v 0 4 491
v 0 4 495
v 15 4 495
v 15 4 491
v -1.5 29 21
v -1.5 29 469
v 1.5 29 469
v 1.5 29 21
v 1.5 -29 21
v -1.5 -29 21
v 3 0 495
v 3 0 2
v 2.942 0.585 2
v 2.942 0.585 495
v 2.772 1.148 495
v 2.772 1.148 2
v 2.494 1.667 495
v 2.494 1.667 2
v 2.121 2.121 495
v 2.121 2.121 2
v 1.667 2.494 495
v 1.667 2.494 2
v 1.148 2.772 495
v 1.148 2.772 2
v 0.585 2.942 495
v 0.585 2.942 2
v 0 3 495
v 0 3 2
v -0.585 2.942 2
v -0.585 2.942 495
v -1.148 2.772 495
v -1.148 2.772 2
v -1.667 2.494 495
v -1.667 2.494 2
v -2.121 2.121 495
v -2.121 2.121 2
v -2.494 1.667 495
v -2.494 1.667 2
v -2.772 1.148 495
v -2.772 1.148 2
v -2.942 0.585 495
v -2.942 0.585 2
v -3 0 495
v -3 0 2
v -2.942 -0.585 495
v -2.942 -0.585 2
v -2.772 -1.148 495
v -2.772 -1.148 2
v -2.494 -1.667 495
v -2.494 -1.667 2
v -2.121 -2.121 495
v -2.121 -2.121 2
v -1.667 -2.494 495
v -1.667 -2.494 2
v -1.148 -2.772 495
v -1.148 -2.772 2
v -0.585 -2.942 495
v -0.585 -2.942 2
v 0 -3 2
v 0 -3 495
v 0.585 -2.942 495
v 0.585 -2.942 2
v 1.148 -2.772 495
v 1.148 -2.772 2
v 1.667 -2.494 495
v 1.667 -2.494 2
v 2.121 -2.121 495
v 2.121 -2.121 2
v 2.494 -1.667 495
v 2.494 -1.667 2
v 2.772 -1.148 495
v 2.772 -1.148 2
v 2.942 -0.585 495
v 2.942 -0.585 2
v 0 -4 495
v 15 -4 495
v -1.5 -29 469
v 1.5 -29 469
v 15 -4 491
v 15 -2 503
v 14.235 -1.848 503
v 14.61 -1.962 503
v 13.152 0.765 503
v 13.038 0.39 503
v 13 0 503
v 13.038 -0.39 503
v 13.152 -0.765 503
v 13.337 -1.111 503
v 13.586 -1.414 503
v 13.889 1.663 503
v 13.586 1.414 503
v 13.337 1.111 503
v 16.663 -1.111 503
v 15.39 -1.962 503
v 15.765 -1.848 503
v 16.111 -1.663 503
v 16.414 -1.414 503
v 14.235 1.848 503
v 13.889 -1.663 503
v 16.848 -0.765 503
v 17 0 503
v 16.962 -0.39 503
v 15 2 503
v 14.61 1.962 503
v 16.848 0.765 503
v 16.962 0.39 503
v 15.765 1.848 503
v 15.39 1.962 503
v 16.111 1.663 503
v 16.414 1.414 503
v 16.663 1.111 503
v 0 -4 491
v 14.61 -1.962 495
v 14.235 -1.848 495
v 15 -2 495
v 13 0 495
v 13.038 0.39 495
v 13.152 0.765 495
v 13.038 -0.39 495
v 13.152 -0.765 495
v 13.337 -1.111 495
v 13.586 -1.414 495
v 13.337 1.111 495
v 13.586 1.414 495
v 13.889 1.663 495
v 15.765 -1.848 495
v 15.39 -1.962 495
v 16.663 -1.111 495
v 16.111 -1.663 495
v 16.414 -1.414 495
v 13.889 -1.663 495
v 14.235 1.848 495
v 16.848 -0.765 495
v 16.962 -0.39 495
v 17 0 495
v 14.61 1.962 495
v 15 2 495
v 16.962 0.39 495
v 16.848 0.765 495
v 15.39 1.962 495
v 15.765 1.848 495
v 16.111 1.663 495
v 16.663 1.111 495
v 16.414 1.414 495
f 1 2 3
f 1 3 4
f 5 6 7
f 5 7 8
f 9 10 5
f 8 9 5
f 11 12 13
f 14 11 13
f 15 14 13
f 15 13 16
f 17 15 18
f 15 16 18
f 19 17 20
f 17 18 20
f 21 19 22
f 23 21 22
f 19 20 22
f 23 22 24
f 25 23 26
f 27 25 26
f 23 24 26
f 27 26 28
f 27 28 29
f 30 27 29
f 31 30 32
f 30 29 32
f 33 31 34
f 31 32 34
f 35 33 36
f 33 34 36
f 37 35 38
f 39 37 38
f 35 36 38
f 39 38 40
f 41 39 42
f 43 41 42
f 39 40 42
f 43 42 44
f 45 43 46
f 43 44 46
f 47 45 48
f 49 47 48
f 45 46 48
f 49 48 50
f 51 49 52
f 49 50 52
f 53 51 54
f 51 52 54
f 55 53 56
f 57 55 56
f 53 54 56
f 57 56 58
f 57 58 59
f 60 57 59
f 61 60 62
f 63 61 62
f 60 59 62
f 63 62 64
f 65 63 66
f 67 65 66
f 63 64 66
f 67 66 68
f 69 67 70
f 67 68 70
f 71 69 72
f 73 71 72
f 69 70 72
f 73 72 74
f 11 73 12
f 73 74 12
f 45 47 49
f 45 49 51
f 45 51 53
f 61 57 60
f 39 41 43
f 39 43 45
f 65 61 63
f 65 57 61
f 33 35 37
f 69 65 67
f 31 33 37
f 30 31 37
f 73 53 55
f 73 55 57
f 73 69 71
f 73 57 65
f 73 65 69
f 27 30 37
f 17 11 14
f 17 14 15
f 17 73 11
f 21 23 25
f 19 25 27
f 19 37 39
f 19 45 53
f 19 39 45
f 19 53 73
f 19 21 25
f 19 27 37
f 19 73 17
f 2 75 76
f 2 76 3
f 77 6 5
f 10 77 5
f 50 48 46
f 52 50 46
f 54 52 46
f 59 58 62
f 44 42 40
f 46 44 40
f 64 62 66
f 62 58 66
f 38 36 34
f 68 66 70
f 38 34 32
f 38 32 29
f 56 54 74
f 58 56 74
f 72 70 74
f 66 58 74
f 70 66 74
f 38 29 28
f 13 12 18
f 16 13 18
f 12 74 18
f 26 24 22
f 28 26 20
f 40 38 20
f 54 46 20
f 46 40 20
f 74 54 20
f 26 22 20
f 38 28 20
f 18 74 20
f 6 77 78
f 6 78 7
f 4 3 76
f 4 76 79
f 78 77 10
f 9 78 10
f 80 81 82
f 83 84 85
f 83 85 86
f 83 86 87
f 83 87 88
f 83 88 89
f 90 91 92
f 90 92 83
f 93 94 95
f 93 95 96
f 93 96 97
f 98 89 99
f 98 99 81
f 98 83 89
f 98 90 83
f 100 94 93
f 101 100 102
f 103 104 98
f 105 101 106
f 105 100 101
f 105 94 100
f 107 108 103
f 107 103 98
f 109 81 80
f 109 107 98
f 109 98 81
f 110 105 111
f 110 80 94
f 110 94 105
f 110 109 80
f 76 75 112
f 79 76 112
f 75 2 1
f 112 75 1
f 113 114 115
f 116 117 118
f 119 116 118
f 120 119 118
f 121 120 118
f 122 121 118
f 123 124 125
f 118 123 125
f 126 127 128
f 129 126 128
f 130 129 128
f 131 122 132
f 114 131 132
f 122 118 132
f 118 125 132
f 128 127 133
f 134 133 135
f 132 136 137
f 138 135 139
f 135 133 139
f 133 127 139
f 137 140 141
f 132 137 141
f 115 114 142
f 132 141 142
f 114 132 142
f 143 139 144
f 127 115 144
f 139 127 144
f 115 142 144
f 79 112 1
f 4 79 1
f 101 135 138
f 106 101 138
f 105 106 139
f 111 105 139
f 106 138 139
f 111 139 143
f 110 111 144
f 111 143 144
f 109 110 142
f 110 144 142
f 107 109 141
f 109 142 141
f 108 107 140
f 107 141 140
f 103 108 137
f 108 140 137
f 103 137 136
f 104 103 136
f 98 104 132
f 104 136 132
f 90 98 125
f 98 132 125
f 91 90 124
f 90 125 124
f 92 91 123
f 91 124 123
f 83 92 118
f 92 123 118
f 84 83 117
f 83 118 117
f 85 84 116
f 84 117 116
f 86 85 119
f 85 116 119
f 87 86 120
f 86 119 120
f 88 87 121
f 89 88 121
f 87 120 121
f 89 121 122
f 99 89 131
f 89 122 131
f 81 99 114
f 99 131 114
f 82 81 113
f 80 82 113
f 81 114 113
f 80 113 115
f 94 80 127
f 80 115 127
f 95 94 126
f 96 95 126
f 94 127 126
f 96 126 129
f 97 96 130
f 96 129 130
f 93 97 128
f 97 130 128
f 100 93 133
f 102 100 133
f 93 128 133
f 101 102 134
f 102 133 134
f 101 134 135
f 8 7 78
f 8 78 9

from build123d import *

# Parameters (mm, degrees)
SKETCH1_W       = 4
SKETCH1_H       = 8
CRANK_DEPTH     = 15
BLADE_START     = -1.5
SKETCH2_W       = 448
SKETCH2_H       = 58
BLADE_DEPTH     = 3
PIVOT_PIN_START = 2
SKETCH3_R       = 3
PIVOT_PIN_DEPTH = 493
CRANK_PIN_START = 495
SKETCH4_R       = 2
CRANK_PIN_DEPTH = 8


with BuildPart() as part:
    # Sketch1 → crank (new body)
    with BuildSketch(Plane(origin=(0, 0, 0), x_dir=(0, 0, -1), z_dir=(1, 0, 0))):
        with Locations((-493, 0)):
            Rectangle(SKETCH1_W, SKETCH1_H)
    extrude(amount=CRANK_DEPTH)


with BuildPart() as body_2:
    # Sketch2 → blade (new body)
    with BuildSketch(Plane(origin=(0, 0, 0), x_dir=(0, 0, -1), z_dir=(1, 0, 0)).offset(BLADE_START)):
        with Locations((-245, 0)):
            Rectangle(SKETCH2_W, SKETCH2_H)
    extrude(amount=BLADE_DEPTH)


with BuildPart() as body_3:
    # Sketch3 → pivot_pin (new body)
    with BuildSketch(Plane.XY.offset(PIVOT_PIN_START)):
        Circle(SKETCH3_R)
    extrude(amount=PIVOT_PIN_DEPTH)


with BuildPart() as body_4:
    # Sketch4 → crank_pin (new body)
    with BuildSketch(Plane.XY.offset(CRANK_PIN_START)):
        with Locations((15, 0)):
            Circle(SKETCH4_R)
    extrude(amount=CRANK_PIN_DEPTH)


solid = Compound([part.part, body_2.part, body_3.part, body_4.part])
